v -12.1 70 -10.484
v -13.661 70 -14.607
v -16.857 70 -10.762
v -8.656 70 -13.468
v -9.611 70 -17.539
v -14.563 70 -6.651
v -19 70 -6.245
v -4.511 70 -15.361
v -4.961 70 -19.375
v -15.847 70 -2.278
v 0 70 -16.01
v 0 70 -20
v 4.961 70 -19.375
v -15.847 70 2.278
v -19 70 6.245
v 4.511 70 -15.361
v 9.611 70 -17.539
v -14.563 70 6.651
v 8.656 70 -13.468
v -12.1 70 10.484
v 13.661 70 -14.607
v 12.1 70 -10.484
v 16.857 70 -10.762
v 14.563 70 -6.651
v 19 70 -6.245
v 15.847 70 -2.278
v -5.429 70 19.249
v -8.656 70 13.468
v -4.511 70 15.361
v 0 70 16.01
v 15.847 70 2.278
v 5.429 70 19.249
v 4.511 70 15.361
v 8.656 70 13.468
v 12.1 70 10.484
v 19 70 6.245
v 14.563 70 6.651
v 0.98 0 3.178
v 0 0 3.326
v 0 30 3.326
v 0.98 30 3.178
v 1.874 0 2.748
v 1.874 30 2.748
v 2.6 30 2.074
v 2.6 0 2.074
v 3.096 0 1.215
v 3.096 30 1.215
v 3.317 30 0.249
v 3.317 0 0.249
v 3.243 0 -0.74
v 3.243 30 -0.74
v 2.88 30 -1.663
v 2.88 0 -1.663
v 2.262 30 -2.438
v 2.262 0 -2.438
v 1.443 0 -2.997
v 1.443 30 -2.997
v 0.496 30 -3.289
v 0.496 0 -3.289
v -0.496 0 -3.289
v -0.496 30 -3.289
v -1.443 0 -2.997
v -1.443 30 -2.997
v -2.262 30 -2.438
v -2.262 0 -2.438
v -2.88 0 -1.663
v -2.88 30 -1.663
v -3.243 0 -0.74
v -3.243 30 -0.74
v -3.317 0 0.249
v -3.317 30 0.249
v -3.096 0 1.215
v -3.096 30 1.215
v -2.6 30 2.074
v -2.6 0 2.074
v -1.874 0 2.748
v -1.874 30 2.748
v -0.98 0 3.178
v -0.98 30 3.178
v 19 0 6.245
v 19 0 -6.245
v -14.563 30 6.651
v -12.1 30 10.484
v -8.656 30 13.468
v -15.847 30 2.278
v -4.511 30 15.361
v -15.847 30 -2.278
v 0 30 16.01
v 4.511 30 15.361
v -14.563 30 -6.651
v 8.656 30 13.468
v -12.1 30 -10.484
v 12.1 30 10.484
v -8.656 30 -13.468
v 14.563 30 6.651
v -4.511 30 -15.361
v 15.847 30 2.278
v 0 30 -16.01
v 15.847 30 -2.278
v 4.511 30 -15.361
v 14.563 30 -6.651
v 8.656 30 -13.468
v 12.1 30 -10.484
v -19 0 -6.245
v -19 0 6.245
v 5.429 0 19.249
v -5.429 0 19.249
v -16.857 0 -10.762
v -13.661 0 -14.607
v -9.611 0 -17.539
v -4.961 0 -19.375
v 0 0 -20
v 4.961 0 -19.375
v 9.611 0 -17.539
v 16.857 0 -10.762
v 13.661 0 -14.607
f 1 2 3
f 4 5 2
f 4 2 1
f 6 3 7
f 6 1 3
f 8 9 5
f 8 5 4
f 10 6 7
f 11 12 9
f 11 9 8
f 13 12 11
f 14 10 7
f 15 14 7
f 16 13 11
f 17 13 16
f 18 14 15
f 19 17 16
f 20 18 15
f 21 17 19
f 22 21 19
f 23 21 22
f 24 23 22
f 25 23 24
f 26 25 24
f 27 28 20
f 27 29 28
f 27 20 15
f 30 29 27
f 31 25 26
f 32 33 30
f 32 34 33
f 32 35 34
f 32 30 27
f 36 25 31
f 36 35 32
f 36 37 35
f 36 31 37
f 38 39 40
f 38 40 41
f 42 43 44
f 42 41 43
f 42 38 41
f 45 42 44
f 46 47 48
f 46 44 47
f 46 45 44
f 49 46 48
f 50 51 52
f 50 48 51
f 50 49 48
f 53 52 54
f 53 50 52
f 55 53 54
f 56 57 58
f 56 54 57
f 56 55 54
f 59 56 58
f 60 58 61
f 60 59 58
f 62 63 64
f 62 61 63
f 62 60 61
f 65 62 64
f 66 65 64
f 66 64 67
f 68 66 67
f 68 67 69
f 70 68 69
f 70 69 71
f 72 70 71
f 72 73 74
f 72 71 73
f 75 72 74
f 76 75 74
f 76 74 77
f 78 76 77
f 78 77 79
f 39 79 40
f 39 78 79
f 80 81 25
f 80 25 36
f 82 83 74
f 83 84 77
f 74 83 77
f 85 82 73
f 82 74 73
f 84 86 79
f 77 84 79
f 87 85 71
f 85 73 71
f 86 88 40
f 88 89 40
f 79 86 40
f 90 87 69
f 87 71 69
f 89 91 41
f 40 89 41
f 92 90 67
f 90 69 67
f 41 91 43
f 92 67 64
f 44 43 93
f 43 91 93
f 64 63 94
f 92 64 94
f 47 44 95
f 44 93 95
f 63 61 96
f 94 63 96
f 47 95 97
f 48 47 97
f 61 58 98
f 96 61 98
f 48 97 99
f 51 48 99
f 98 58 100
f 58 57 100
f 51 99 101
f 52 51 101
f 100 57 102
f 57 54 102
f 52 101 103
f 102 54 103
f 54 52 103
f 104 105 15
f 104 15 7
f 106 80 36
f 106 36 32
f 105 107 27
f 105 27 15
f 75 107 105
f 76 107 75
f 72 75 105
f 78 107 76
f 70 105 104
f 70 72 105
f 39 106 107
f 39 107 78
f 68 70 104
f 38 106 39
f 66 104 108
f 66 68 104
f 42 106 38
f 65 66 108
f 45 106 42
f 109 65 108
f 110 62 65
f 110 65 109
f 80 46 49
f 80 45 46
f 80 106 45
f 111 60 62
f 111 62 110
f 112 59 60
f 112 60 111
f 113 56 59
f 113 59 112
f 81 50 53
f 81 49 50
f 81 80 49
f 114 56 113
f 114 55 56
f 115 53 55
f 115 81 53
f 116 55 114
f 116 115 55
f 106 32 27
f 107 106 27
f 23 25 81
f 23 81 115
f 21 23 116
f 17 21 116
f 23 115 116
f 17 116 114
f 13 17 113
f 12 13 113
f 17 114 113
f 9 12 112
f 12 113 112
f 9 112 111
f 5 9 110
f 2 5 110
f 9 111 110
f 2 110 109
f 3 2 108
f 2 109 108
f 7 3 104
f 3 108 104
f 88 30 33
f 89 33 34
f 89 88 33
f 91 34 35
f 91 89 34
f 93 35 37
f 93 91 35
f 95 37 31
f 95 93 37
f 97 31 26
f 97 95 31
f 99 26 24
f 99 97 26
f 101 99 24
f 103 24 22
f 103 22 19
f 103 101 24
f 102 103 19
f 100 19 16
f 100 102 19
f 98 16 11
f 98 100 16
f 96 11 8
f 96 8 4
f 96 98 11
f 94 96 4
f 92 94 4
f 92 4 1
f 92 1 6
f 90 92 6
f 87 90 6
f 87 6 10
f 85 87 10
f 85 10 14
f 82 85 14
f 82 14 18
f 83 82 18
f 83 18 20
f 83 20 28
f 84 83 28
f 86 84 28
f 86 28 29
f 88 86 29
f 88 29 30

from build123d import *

# Parameters (mm, degrees)
SKETCH1_R               = 20
SKETCH1_R_2             = 16.01
BOSS_EXTRUDE1_DEPTH     = 70
CUT_EXTRUDE1_DEPTH      = 76.498344353
CUT_EXTRUDE1_DEPTH_BACK = 76.498344353
SKETCH3_R               = 16.01
BOSS_EXTRUDE2_DEPTH     = 30
CUT_EXTRUDE2_DEPTH      = 49.590122453
CUT_EXTRUDE2_DEPTH_BACK = 49.590122453
SKETCH4_R               = 3.326


with BuildPart() as part:
    # Sketch1 → Boss-Extrude1 (new body)
    with BuildSketch(Plane(origin=(0, 0, 0), x_dir=(1, 0, 0), z_dir=(0, 1, 0))):
        with Locations(Location((0, 0, 0), (0, 0, 270))):
            Circle(SKETCH1_R)
        with Locations(Location((0, 0, 0), (0, 0, 270))):
            Circle(SKETCH1_R_2, mode=Mode.SUBTRACT)
    extrude(amount=BOSS_EXTRUDE1_DEPTH)

    # Sketch2 → Cut-Extrude1 (cut, two sides: drawn at the far end of the back side and taken through both)
    with BuildSketch(Plane(origin=(0, 70, 0), x_dir=(1, 0, 0), z_dir=(0, 1, 0)).offset(-CUT_EXTRUDE1_DEPTH_BACK)):
        with BuildLine():
            Line((-19, -6.244997998), (-19, 6.244997998))
            ThreePointArc((-19, 6.244997998), (-20, 0), (-19, -6.244997998))
        make_face()
        with BuildLine():
            Line((-5.4292033, -19.24899352), (-19, -6.244997998))
            ThreePointArc((-19, -6.244997998), (-13.837357709, -14.44048239), (-5.4292033, -19.24899352))
        make_face()
        with BuildLine():
            ThreePointArc((5.4292033, -19.24899352), (13.837357709, -14.44048239), (19, -6.244997998))
            Line((19, -6.244997998), (5.4292033, -19.24899352))
        make_face()
        with BuildLine():
            Line((0, -19.24899352), (-5.4292033, -19.24899352))
            ThreePointArc((-5.4292033, -19.24899352), (-2.740449745, -19.811358742), (0, -20))
            Line((0, -20), (0, -19.24899352))
        make_face()
        with BuildLine():
            Line((5.4292033, -19.24899352), (0, -19.24899352))
            Line((0, -19.24899352), (0, -20))
            ThreePointArc((0, -20), (2.740449745, -19.811358742), (5.4292033, -19.24899352))
        make_face()
        with BuildLine():
            ThreePointArc((20, 0), (19.748417658, 3.16227766), (19, 6.244997998))
            Line((19, 6.244997998), (19, -6.244997998))
            ThreePointArc((19, -6.244997998), (19.748417658, -3.16227766), (20, 0))
        make_face()
    extrude(amount=CUT_EXTRUDE1_DEPTH + CUT_EXTRUDE1_DEPTH_BACK, mode=Mode.SUBTRACT)

    # Sketch3 → Boss-Extrude2 (add)
    with BuildSketch(Plane.XZ):
        with Locations(Location((0, 0, 0), (0, 0, 270))):
            Circle(SKETCH3_R)
    extrude(amount=-BOSS_EXTRUDE2_DEPTH)

    # Sketch4 → Cut-Extrude2 (cut, two sides: drawn at the far end of the back side and taken through both)
    with BuildSketch(Plane(origin=(0, 30, 0), x_dir=(1, 0, 0), z_dir=(0, 1, 0)).offset(-CUT_EXTRUDE2_DEPTH_BACK)):
        with Locations(Location((0, 0, 0), (0, 0, 270))):
            Circle(SKETCH4_R)
    extrude(amount=CUT_EXTRUDE2_DEPTH + CUT_EXTRUDE2_DEPTH_BACK, mode=Mode.SUBTRACT)


solid = part.part
